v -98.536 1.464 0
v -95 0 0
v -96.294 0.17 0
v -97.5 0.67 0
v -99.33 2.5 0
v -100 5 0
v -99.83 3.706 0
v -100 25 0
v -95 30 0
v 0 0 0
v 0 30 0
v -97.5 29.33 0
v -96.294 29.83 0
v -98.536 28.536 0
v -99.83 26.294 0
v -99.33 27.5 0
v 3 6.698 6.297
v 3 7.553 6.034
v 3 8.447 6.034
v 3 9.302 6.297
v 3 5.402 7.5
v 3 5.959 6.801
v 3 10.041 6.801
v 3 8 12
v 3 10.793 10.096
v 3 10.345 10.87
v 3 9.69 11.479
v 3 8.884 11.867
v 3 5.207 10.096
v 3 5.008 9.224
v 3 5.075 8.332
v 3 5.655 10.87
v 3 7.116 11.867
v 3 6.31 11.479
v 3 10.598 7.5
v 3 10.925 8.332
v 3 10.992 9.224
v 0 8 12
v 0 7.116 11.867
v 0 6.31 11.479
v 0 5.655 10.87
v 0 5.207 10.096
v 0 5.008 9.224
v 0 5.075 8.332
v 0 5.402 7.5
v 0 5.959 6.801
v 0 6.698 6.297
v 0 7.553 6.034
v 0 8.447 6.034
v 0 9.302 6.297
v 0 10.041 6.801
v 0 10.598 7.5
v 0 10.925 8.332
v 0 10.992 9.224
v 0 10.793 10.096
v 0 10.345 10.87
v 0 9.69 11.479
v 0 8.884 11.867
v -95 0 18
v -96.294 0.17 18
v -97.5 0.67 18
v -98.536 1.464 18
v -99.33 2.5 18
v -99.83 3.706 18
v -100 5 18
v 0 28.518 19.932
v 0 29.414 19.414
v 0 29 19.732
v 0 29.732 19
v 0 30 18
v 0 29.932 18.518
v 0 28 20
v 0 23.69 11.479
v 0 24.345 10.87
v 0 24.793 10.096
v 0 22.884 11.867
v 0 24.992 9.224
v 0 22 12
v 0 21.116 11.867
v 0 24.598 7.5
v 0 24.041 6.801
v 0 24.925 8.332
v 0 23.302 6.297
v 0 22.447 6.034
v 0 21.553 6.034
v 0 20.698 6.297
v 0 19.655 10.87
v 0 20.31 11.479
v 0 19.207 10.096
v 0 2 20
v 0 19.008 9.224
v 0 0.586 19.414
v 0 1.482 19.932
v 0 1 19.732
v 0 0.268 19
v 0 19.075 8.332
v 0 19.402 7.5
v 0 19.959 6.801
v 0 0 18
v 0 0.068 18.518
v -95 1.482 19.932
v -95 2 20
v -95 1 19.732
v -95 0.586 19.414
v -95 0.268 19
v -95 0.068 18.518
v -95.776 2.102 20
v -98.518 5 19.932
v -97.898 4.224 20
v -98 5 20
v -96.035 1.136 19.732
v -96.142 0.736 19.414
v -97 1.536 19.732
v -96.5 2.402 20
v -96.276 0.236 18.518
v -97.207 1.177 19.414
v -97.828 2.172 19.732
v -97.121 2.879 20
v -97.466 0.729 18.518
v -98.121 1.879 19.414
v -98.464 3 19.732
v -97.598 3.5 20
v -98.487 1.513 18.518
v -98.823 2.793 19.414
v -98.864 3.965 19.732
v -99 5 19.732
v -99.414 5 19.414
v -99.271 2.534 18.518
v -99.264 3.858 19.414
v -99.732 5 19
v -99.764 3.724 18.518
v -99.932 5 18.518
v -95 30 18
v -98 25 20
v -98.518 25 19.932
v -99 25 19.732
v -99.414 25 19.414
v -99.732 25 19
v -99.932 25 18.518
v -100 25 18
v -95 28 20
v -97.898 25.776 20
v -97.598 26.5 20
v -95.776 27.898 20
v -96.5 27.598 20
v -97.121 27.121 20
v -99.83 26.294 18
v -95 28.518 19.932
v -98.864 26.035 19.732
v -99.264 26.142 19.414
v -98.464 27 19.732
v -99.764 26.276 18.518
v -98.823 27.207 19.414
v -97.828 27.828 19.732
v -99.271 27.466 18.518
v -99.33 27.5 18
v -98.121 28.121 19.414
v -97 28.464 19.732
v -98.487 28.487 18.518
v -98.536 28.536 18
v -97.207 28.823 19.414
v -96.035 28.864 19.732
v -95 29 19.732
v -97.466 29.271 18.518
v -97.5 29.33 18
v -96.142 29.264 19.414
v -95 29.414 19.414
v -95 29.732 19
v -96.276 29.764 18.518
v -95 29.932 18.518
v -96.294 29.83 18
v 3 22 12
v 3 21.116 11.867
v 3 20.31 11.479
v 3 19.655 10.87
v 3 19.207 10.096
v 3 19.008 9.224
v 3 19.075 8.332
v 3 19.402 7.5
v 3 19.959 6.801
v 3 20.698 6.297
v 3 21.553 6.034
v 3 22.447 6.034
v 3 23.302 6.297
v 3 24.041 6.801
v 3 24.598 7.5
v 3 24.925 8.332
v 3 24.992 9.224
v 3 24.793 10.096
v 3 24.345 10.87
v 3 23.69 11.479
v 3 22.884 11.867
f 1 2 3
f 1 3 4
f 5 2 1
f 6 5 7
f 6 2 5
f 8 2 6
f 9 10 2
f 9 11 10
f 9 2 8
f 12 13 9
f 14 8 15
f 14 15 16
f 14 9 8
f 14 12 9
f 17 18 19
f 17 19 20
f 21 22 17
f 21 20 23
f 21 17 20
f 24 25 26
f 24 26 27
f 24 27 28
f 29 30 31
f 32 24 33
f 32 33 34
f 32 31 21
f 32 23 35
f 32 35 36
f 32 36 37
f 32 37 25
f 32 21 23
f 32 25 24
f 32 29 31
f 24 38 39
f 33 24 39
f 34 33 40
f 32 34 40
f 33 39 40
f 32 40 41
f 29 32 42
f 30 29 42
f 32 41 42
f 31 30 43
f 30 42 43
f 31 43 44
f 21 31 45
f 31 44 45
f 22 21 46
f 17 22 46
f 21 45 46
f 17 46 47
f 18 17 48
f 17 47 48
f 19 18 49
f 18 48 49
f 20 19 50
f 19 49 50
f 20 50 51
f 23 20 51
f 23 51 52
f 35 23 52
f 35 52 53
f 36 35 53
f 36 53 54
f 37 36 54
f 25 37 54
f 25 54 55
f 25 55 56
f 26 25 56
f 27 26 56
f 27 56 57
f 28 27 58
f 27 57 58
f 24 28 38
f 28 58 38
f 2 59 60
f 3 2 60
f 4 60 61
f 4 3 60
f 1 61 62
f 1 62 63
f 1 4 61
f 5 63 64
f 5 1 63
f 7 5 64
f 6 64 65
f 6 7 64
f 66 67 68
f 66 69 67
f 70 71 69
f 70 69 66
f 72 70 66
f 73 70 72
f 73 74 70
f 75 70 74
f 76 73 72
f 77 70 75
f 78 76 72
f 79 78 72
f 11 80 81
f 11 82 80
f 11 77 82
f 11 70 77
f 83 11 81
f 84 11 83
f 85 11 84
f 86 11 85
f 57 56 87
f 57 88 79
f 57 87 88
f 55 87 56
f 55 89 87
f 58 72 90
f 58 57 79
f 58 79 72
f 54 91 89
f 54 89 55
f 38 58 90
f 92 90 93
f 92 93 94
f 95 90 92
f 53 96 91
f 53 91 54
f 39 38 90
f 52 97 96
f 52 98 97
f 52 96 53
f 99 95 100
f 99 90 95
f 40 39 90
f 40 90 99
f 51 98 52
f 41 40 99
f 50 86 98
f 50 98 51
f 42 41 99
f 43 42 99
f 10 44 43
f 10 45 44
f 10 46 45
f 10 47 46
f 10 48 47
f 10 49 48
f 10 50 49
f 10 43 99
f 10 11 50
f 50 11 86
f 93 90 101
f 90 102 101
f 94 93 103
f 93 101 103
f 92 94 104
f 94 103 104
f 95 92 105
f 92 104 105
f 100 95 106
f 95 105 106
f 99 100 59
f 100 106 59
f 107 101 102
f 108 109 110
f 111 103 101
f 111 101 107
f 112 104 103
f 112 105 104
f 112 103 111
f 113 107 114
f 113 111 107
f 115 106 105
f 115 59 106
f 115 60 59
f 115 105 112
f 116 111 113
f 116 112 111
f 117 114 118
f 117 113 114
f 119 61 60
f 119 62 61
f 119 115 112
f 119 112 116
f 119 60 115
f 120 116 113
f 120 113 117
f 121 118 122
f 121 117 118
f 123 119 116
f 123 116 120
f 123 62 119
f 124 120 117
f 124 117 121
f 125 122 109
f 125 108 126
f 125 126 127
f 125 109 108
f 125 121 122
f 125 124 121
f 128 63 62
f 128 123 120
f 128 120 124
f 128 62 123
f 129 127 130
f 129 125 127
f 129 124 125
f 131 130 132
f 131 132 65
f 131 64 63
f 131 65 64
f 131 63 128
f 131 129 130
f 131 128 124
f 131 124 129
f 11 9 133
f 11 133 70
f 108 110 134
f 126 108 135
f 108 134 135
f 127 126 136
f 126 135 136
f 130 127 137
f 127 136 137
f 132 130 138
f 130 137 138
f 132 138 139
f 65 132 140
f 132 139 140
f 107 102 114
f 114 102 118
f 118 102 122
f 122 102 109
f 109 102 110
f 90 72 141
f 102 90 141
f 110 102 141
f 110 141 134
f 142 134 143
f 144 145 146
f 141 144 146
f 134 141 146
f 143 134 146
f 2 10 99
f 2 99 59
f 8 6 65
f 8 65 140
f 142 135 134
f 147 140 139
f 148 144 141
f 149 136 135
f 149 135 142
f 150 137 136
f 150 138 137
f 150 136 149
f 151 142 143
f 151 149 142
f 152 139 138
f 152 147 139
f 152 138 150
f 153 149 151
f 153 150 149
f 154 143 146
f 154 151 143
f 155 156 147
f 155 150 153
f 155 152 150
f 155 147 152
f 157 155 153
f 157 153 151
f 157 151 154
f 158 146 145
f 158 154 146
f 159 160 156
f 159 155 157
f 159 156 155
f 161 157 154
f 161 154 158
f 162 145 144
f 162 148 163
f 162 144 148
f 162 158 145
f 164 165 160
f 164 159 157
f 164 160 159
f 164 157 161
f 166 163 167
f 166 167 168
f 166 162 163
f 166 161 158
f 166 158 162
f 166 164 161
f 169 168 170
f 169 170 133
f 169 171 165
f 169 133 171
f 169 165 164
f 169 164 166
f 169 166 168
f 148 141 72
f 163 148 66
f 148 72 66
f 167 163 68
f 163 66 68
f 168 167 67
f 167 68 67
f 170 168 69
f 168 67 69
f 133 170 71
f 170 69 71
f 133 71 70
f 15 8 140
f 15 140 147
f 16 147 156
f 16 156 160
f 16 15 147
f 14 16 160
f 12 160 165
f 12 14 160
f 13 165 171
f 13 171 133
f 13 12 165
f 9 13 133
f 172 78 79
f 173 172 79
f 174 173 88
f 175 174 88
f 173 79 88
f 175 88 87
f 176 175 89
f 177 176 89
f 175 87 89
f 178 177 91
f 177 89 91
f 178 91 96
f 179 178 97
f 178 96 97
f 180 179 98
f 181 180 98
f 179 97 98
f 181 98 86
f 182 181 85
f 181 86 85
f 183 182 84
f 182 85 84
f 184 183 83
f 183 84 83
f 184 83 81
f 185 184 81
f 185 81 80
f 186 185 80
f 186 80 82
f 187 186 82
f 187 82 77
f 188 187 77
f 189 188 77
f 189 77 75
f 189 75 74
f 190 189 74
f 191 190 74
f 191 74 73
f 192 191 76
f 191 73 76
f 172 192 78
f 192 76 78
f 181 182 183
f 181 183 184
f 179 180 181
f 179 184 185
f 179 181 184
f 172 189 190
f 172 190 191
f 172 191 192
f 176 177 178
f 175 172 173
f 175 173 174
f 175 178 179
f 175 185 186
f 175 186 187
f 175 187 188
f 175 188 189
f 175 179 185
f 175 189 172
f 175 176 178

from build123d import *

# Parameters (mm, degrees)
BOSS_EXTRUDE1_DEPTH = 20
SKETCH3_R           = 3
BOSS_EXTRUDE3_DEPTH = 3
FILLET2_R           = 2


with BuildPart() as part:
    # Sketch1 → Boss-Extrude1 (new body)
    with BuildSketch(Plane.XY):
        with BuildLine():
            Line((0, 0), (-95, 0))
            ThreePointArc((-95, 0), (-98.535533906, 1.464466094), (-100, 5))
            Line((-100, 5), (-100, 25))
            ThreePointArc((-100, 25), (-98.535533906, 28.535533906), (-95, 30))
            Line((-95, 30), (0, 30))
            Line((0, 30), (0, 0))
        make_face()
    extrude(amount=BOSS_EXTRUDE1_DEPTH)

    # Sketch3 → Boss-Extrude3 (add)
    with BuildSketch(Plane(origin=(0, 0, 0), x_dir=(0, 0, -1), z_dir=(1, 0, 0))):
        with Locations(Location((-9, 22, 0), (0, 0, 180))):
            Circle(SKETCH3_R)
        with Locations(Location((-9, 8, 0), (0, 0, 180))):
            Circle(SKETCH3_R)
    extrude(amount=BOSS_EXTRUDE3_DEPTH)

    # Fillet2
    fillet2_edges = [part.edges().sort_by_distance(p)[0] for p in [
        (-98.535533906, 28.535533906, 20),
        (-100, 15, 20),
        (-98.535533906, 1.464466094, 20),
        (-47.5, 0, 20),
        (-47.5, 30, 20),
    ]]
    fillet(fillet2_edges, radius=FILLET2_R)


solid = part.part
